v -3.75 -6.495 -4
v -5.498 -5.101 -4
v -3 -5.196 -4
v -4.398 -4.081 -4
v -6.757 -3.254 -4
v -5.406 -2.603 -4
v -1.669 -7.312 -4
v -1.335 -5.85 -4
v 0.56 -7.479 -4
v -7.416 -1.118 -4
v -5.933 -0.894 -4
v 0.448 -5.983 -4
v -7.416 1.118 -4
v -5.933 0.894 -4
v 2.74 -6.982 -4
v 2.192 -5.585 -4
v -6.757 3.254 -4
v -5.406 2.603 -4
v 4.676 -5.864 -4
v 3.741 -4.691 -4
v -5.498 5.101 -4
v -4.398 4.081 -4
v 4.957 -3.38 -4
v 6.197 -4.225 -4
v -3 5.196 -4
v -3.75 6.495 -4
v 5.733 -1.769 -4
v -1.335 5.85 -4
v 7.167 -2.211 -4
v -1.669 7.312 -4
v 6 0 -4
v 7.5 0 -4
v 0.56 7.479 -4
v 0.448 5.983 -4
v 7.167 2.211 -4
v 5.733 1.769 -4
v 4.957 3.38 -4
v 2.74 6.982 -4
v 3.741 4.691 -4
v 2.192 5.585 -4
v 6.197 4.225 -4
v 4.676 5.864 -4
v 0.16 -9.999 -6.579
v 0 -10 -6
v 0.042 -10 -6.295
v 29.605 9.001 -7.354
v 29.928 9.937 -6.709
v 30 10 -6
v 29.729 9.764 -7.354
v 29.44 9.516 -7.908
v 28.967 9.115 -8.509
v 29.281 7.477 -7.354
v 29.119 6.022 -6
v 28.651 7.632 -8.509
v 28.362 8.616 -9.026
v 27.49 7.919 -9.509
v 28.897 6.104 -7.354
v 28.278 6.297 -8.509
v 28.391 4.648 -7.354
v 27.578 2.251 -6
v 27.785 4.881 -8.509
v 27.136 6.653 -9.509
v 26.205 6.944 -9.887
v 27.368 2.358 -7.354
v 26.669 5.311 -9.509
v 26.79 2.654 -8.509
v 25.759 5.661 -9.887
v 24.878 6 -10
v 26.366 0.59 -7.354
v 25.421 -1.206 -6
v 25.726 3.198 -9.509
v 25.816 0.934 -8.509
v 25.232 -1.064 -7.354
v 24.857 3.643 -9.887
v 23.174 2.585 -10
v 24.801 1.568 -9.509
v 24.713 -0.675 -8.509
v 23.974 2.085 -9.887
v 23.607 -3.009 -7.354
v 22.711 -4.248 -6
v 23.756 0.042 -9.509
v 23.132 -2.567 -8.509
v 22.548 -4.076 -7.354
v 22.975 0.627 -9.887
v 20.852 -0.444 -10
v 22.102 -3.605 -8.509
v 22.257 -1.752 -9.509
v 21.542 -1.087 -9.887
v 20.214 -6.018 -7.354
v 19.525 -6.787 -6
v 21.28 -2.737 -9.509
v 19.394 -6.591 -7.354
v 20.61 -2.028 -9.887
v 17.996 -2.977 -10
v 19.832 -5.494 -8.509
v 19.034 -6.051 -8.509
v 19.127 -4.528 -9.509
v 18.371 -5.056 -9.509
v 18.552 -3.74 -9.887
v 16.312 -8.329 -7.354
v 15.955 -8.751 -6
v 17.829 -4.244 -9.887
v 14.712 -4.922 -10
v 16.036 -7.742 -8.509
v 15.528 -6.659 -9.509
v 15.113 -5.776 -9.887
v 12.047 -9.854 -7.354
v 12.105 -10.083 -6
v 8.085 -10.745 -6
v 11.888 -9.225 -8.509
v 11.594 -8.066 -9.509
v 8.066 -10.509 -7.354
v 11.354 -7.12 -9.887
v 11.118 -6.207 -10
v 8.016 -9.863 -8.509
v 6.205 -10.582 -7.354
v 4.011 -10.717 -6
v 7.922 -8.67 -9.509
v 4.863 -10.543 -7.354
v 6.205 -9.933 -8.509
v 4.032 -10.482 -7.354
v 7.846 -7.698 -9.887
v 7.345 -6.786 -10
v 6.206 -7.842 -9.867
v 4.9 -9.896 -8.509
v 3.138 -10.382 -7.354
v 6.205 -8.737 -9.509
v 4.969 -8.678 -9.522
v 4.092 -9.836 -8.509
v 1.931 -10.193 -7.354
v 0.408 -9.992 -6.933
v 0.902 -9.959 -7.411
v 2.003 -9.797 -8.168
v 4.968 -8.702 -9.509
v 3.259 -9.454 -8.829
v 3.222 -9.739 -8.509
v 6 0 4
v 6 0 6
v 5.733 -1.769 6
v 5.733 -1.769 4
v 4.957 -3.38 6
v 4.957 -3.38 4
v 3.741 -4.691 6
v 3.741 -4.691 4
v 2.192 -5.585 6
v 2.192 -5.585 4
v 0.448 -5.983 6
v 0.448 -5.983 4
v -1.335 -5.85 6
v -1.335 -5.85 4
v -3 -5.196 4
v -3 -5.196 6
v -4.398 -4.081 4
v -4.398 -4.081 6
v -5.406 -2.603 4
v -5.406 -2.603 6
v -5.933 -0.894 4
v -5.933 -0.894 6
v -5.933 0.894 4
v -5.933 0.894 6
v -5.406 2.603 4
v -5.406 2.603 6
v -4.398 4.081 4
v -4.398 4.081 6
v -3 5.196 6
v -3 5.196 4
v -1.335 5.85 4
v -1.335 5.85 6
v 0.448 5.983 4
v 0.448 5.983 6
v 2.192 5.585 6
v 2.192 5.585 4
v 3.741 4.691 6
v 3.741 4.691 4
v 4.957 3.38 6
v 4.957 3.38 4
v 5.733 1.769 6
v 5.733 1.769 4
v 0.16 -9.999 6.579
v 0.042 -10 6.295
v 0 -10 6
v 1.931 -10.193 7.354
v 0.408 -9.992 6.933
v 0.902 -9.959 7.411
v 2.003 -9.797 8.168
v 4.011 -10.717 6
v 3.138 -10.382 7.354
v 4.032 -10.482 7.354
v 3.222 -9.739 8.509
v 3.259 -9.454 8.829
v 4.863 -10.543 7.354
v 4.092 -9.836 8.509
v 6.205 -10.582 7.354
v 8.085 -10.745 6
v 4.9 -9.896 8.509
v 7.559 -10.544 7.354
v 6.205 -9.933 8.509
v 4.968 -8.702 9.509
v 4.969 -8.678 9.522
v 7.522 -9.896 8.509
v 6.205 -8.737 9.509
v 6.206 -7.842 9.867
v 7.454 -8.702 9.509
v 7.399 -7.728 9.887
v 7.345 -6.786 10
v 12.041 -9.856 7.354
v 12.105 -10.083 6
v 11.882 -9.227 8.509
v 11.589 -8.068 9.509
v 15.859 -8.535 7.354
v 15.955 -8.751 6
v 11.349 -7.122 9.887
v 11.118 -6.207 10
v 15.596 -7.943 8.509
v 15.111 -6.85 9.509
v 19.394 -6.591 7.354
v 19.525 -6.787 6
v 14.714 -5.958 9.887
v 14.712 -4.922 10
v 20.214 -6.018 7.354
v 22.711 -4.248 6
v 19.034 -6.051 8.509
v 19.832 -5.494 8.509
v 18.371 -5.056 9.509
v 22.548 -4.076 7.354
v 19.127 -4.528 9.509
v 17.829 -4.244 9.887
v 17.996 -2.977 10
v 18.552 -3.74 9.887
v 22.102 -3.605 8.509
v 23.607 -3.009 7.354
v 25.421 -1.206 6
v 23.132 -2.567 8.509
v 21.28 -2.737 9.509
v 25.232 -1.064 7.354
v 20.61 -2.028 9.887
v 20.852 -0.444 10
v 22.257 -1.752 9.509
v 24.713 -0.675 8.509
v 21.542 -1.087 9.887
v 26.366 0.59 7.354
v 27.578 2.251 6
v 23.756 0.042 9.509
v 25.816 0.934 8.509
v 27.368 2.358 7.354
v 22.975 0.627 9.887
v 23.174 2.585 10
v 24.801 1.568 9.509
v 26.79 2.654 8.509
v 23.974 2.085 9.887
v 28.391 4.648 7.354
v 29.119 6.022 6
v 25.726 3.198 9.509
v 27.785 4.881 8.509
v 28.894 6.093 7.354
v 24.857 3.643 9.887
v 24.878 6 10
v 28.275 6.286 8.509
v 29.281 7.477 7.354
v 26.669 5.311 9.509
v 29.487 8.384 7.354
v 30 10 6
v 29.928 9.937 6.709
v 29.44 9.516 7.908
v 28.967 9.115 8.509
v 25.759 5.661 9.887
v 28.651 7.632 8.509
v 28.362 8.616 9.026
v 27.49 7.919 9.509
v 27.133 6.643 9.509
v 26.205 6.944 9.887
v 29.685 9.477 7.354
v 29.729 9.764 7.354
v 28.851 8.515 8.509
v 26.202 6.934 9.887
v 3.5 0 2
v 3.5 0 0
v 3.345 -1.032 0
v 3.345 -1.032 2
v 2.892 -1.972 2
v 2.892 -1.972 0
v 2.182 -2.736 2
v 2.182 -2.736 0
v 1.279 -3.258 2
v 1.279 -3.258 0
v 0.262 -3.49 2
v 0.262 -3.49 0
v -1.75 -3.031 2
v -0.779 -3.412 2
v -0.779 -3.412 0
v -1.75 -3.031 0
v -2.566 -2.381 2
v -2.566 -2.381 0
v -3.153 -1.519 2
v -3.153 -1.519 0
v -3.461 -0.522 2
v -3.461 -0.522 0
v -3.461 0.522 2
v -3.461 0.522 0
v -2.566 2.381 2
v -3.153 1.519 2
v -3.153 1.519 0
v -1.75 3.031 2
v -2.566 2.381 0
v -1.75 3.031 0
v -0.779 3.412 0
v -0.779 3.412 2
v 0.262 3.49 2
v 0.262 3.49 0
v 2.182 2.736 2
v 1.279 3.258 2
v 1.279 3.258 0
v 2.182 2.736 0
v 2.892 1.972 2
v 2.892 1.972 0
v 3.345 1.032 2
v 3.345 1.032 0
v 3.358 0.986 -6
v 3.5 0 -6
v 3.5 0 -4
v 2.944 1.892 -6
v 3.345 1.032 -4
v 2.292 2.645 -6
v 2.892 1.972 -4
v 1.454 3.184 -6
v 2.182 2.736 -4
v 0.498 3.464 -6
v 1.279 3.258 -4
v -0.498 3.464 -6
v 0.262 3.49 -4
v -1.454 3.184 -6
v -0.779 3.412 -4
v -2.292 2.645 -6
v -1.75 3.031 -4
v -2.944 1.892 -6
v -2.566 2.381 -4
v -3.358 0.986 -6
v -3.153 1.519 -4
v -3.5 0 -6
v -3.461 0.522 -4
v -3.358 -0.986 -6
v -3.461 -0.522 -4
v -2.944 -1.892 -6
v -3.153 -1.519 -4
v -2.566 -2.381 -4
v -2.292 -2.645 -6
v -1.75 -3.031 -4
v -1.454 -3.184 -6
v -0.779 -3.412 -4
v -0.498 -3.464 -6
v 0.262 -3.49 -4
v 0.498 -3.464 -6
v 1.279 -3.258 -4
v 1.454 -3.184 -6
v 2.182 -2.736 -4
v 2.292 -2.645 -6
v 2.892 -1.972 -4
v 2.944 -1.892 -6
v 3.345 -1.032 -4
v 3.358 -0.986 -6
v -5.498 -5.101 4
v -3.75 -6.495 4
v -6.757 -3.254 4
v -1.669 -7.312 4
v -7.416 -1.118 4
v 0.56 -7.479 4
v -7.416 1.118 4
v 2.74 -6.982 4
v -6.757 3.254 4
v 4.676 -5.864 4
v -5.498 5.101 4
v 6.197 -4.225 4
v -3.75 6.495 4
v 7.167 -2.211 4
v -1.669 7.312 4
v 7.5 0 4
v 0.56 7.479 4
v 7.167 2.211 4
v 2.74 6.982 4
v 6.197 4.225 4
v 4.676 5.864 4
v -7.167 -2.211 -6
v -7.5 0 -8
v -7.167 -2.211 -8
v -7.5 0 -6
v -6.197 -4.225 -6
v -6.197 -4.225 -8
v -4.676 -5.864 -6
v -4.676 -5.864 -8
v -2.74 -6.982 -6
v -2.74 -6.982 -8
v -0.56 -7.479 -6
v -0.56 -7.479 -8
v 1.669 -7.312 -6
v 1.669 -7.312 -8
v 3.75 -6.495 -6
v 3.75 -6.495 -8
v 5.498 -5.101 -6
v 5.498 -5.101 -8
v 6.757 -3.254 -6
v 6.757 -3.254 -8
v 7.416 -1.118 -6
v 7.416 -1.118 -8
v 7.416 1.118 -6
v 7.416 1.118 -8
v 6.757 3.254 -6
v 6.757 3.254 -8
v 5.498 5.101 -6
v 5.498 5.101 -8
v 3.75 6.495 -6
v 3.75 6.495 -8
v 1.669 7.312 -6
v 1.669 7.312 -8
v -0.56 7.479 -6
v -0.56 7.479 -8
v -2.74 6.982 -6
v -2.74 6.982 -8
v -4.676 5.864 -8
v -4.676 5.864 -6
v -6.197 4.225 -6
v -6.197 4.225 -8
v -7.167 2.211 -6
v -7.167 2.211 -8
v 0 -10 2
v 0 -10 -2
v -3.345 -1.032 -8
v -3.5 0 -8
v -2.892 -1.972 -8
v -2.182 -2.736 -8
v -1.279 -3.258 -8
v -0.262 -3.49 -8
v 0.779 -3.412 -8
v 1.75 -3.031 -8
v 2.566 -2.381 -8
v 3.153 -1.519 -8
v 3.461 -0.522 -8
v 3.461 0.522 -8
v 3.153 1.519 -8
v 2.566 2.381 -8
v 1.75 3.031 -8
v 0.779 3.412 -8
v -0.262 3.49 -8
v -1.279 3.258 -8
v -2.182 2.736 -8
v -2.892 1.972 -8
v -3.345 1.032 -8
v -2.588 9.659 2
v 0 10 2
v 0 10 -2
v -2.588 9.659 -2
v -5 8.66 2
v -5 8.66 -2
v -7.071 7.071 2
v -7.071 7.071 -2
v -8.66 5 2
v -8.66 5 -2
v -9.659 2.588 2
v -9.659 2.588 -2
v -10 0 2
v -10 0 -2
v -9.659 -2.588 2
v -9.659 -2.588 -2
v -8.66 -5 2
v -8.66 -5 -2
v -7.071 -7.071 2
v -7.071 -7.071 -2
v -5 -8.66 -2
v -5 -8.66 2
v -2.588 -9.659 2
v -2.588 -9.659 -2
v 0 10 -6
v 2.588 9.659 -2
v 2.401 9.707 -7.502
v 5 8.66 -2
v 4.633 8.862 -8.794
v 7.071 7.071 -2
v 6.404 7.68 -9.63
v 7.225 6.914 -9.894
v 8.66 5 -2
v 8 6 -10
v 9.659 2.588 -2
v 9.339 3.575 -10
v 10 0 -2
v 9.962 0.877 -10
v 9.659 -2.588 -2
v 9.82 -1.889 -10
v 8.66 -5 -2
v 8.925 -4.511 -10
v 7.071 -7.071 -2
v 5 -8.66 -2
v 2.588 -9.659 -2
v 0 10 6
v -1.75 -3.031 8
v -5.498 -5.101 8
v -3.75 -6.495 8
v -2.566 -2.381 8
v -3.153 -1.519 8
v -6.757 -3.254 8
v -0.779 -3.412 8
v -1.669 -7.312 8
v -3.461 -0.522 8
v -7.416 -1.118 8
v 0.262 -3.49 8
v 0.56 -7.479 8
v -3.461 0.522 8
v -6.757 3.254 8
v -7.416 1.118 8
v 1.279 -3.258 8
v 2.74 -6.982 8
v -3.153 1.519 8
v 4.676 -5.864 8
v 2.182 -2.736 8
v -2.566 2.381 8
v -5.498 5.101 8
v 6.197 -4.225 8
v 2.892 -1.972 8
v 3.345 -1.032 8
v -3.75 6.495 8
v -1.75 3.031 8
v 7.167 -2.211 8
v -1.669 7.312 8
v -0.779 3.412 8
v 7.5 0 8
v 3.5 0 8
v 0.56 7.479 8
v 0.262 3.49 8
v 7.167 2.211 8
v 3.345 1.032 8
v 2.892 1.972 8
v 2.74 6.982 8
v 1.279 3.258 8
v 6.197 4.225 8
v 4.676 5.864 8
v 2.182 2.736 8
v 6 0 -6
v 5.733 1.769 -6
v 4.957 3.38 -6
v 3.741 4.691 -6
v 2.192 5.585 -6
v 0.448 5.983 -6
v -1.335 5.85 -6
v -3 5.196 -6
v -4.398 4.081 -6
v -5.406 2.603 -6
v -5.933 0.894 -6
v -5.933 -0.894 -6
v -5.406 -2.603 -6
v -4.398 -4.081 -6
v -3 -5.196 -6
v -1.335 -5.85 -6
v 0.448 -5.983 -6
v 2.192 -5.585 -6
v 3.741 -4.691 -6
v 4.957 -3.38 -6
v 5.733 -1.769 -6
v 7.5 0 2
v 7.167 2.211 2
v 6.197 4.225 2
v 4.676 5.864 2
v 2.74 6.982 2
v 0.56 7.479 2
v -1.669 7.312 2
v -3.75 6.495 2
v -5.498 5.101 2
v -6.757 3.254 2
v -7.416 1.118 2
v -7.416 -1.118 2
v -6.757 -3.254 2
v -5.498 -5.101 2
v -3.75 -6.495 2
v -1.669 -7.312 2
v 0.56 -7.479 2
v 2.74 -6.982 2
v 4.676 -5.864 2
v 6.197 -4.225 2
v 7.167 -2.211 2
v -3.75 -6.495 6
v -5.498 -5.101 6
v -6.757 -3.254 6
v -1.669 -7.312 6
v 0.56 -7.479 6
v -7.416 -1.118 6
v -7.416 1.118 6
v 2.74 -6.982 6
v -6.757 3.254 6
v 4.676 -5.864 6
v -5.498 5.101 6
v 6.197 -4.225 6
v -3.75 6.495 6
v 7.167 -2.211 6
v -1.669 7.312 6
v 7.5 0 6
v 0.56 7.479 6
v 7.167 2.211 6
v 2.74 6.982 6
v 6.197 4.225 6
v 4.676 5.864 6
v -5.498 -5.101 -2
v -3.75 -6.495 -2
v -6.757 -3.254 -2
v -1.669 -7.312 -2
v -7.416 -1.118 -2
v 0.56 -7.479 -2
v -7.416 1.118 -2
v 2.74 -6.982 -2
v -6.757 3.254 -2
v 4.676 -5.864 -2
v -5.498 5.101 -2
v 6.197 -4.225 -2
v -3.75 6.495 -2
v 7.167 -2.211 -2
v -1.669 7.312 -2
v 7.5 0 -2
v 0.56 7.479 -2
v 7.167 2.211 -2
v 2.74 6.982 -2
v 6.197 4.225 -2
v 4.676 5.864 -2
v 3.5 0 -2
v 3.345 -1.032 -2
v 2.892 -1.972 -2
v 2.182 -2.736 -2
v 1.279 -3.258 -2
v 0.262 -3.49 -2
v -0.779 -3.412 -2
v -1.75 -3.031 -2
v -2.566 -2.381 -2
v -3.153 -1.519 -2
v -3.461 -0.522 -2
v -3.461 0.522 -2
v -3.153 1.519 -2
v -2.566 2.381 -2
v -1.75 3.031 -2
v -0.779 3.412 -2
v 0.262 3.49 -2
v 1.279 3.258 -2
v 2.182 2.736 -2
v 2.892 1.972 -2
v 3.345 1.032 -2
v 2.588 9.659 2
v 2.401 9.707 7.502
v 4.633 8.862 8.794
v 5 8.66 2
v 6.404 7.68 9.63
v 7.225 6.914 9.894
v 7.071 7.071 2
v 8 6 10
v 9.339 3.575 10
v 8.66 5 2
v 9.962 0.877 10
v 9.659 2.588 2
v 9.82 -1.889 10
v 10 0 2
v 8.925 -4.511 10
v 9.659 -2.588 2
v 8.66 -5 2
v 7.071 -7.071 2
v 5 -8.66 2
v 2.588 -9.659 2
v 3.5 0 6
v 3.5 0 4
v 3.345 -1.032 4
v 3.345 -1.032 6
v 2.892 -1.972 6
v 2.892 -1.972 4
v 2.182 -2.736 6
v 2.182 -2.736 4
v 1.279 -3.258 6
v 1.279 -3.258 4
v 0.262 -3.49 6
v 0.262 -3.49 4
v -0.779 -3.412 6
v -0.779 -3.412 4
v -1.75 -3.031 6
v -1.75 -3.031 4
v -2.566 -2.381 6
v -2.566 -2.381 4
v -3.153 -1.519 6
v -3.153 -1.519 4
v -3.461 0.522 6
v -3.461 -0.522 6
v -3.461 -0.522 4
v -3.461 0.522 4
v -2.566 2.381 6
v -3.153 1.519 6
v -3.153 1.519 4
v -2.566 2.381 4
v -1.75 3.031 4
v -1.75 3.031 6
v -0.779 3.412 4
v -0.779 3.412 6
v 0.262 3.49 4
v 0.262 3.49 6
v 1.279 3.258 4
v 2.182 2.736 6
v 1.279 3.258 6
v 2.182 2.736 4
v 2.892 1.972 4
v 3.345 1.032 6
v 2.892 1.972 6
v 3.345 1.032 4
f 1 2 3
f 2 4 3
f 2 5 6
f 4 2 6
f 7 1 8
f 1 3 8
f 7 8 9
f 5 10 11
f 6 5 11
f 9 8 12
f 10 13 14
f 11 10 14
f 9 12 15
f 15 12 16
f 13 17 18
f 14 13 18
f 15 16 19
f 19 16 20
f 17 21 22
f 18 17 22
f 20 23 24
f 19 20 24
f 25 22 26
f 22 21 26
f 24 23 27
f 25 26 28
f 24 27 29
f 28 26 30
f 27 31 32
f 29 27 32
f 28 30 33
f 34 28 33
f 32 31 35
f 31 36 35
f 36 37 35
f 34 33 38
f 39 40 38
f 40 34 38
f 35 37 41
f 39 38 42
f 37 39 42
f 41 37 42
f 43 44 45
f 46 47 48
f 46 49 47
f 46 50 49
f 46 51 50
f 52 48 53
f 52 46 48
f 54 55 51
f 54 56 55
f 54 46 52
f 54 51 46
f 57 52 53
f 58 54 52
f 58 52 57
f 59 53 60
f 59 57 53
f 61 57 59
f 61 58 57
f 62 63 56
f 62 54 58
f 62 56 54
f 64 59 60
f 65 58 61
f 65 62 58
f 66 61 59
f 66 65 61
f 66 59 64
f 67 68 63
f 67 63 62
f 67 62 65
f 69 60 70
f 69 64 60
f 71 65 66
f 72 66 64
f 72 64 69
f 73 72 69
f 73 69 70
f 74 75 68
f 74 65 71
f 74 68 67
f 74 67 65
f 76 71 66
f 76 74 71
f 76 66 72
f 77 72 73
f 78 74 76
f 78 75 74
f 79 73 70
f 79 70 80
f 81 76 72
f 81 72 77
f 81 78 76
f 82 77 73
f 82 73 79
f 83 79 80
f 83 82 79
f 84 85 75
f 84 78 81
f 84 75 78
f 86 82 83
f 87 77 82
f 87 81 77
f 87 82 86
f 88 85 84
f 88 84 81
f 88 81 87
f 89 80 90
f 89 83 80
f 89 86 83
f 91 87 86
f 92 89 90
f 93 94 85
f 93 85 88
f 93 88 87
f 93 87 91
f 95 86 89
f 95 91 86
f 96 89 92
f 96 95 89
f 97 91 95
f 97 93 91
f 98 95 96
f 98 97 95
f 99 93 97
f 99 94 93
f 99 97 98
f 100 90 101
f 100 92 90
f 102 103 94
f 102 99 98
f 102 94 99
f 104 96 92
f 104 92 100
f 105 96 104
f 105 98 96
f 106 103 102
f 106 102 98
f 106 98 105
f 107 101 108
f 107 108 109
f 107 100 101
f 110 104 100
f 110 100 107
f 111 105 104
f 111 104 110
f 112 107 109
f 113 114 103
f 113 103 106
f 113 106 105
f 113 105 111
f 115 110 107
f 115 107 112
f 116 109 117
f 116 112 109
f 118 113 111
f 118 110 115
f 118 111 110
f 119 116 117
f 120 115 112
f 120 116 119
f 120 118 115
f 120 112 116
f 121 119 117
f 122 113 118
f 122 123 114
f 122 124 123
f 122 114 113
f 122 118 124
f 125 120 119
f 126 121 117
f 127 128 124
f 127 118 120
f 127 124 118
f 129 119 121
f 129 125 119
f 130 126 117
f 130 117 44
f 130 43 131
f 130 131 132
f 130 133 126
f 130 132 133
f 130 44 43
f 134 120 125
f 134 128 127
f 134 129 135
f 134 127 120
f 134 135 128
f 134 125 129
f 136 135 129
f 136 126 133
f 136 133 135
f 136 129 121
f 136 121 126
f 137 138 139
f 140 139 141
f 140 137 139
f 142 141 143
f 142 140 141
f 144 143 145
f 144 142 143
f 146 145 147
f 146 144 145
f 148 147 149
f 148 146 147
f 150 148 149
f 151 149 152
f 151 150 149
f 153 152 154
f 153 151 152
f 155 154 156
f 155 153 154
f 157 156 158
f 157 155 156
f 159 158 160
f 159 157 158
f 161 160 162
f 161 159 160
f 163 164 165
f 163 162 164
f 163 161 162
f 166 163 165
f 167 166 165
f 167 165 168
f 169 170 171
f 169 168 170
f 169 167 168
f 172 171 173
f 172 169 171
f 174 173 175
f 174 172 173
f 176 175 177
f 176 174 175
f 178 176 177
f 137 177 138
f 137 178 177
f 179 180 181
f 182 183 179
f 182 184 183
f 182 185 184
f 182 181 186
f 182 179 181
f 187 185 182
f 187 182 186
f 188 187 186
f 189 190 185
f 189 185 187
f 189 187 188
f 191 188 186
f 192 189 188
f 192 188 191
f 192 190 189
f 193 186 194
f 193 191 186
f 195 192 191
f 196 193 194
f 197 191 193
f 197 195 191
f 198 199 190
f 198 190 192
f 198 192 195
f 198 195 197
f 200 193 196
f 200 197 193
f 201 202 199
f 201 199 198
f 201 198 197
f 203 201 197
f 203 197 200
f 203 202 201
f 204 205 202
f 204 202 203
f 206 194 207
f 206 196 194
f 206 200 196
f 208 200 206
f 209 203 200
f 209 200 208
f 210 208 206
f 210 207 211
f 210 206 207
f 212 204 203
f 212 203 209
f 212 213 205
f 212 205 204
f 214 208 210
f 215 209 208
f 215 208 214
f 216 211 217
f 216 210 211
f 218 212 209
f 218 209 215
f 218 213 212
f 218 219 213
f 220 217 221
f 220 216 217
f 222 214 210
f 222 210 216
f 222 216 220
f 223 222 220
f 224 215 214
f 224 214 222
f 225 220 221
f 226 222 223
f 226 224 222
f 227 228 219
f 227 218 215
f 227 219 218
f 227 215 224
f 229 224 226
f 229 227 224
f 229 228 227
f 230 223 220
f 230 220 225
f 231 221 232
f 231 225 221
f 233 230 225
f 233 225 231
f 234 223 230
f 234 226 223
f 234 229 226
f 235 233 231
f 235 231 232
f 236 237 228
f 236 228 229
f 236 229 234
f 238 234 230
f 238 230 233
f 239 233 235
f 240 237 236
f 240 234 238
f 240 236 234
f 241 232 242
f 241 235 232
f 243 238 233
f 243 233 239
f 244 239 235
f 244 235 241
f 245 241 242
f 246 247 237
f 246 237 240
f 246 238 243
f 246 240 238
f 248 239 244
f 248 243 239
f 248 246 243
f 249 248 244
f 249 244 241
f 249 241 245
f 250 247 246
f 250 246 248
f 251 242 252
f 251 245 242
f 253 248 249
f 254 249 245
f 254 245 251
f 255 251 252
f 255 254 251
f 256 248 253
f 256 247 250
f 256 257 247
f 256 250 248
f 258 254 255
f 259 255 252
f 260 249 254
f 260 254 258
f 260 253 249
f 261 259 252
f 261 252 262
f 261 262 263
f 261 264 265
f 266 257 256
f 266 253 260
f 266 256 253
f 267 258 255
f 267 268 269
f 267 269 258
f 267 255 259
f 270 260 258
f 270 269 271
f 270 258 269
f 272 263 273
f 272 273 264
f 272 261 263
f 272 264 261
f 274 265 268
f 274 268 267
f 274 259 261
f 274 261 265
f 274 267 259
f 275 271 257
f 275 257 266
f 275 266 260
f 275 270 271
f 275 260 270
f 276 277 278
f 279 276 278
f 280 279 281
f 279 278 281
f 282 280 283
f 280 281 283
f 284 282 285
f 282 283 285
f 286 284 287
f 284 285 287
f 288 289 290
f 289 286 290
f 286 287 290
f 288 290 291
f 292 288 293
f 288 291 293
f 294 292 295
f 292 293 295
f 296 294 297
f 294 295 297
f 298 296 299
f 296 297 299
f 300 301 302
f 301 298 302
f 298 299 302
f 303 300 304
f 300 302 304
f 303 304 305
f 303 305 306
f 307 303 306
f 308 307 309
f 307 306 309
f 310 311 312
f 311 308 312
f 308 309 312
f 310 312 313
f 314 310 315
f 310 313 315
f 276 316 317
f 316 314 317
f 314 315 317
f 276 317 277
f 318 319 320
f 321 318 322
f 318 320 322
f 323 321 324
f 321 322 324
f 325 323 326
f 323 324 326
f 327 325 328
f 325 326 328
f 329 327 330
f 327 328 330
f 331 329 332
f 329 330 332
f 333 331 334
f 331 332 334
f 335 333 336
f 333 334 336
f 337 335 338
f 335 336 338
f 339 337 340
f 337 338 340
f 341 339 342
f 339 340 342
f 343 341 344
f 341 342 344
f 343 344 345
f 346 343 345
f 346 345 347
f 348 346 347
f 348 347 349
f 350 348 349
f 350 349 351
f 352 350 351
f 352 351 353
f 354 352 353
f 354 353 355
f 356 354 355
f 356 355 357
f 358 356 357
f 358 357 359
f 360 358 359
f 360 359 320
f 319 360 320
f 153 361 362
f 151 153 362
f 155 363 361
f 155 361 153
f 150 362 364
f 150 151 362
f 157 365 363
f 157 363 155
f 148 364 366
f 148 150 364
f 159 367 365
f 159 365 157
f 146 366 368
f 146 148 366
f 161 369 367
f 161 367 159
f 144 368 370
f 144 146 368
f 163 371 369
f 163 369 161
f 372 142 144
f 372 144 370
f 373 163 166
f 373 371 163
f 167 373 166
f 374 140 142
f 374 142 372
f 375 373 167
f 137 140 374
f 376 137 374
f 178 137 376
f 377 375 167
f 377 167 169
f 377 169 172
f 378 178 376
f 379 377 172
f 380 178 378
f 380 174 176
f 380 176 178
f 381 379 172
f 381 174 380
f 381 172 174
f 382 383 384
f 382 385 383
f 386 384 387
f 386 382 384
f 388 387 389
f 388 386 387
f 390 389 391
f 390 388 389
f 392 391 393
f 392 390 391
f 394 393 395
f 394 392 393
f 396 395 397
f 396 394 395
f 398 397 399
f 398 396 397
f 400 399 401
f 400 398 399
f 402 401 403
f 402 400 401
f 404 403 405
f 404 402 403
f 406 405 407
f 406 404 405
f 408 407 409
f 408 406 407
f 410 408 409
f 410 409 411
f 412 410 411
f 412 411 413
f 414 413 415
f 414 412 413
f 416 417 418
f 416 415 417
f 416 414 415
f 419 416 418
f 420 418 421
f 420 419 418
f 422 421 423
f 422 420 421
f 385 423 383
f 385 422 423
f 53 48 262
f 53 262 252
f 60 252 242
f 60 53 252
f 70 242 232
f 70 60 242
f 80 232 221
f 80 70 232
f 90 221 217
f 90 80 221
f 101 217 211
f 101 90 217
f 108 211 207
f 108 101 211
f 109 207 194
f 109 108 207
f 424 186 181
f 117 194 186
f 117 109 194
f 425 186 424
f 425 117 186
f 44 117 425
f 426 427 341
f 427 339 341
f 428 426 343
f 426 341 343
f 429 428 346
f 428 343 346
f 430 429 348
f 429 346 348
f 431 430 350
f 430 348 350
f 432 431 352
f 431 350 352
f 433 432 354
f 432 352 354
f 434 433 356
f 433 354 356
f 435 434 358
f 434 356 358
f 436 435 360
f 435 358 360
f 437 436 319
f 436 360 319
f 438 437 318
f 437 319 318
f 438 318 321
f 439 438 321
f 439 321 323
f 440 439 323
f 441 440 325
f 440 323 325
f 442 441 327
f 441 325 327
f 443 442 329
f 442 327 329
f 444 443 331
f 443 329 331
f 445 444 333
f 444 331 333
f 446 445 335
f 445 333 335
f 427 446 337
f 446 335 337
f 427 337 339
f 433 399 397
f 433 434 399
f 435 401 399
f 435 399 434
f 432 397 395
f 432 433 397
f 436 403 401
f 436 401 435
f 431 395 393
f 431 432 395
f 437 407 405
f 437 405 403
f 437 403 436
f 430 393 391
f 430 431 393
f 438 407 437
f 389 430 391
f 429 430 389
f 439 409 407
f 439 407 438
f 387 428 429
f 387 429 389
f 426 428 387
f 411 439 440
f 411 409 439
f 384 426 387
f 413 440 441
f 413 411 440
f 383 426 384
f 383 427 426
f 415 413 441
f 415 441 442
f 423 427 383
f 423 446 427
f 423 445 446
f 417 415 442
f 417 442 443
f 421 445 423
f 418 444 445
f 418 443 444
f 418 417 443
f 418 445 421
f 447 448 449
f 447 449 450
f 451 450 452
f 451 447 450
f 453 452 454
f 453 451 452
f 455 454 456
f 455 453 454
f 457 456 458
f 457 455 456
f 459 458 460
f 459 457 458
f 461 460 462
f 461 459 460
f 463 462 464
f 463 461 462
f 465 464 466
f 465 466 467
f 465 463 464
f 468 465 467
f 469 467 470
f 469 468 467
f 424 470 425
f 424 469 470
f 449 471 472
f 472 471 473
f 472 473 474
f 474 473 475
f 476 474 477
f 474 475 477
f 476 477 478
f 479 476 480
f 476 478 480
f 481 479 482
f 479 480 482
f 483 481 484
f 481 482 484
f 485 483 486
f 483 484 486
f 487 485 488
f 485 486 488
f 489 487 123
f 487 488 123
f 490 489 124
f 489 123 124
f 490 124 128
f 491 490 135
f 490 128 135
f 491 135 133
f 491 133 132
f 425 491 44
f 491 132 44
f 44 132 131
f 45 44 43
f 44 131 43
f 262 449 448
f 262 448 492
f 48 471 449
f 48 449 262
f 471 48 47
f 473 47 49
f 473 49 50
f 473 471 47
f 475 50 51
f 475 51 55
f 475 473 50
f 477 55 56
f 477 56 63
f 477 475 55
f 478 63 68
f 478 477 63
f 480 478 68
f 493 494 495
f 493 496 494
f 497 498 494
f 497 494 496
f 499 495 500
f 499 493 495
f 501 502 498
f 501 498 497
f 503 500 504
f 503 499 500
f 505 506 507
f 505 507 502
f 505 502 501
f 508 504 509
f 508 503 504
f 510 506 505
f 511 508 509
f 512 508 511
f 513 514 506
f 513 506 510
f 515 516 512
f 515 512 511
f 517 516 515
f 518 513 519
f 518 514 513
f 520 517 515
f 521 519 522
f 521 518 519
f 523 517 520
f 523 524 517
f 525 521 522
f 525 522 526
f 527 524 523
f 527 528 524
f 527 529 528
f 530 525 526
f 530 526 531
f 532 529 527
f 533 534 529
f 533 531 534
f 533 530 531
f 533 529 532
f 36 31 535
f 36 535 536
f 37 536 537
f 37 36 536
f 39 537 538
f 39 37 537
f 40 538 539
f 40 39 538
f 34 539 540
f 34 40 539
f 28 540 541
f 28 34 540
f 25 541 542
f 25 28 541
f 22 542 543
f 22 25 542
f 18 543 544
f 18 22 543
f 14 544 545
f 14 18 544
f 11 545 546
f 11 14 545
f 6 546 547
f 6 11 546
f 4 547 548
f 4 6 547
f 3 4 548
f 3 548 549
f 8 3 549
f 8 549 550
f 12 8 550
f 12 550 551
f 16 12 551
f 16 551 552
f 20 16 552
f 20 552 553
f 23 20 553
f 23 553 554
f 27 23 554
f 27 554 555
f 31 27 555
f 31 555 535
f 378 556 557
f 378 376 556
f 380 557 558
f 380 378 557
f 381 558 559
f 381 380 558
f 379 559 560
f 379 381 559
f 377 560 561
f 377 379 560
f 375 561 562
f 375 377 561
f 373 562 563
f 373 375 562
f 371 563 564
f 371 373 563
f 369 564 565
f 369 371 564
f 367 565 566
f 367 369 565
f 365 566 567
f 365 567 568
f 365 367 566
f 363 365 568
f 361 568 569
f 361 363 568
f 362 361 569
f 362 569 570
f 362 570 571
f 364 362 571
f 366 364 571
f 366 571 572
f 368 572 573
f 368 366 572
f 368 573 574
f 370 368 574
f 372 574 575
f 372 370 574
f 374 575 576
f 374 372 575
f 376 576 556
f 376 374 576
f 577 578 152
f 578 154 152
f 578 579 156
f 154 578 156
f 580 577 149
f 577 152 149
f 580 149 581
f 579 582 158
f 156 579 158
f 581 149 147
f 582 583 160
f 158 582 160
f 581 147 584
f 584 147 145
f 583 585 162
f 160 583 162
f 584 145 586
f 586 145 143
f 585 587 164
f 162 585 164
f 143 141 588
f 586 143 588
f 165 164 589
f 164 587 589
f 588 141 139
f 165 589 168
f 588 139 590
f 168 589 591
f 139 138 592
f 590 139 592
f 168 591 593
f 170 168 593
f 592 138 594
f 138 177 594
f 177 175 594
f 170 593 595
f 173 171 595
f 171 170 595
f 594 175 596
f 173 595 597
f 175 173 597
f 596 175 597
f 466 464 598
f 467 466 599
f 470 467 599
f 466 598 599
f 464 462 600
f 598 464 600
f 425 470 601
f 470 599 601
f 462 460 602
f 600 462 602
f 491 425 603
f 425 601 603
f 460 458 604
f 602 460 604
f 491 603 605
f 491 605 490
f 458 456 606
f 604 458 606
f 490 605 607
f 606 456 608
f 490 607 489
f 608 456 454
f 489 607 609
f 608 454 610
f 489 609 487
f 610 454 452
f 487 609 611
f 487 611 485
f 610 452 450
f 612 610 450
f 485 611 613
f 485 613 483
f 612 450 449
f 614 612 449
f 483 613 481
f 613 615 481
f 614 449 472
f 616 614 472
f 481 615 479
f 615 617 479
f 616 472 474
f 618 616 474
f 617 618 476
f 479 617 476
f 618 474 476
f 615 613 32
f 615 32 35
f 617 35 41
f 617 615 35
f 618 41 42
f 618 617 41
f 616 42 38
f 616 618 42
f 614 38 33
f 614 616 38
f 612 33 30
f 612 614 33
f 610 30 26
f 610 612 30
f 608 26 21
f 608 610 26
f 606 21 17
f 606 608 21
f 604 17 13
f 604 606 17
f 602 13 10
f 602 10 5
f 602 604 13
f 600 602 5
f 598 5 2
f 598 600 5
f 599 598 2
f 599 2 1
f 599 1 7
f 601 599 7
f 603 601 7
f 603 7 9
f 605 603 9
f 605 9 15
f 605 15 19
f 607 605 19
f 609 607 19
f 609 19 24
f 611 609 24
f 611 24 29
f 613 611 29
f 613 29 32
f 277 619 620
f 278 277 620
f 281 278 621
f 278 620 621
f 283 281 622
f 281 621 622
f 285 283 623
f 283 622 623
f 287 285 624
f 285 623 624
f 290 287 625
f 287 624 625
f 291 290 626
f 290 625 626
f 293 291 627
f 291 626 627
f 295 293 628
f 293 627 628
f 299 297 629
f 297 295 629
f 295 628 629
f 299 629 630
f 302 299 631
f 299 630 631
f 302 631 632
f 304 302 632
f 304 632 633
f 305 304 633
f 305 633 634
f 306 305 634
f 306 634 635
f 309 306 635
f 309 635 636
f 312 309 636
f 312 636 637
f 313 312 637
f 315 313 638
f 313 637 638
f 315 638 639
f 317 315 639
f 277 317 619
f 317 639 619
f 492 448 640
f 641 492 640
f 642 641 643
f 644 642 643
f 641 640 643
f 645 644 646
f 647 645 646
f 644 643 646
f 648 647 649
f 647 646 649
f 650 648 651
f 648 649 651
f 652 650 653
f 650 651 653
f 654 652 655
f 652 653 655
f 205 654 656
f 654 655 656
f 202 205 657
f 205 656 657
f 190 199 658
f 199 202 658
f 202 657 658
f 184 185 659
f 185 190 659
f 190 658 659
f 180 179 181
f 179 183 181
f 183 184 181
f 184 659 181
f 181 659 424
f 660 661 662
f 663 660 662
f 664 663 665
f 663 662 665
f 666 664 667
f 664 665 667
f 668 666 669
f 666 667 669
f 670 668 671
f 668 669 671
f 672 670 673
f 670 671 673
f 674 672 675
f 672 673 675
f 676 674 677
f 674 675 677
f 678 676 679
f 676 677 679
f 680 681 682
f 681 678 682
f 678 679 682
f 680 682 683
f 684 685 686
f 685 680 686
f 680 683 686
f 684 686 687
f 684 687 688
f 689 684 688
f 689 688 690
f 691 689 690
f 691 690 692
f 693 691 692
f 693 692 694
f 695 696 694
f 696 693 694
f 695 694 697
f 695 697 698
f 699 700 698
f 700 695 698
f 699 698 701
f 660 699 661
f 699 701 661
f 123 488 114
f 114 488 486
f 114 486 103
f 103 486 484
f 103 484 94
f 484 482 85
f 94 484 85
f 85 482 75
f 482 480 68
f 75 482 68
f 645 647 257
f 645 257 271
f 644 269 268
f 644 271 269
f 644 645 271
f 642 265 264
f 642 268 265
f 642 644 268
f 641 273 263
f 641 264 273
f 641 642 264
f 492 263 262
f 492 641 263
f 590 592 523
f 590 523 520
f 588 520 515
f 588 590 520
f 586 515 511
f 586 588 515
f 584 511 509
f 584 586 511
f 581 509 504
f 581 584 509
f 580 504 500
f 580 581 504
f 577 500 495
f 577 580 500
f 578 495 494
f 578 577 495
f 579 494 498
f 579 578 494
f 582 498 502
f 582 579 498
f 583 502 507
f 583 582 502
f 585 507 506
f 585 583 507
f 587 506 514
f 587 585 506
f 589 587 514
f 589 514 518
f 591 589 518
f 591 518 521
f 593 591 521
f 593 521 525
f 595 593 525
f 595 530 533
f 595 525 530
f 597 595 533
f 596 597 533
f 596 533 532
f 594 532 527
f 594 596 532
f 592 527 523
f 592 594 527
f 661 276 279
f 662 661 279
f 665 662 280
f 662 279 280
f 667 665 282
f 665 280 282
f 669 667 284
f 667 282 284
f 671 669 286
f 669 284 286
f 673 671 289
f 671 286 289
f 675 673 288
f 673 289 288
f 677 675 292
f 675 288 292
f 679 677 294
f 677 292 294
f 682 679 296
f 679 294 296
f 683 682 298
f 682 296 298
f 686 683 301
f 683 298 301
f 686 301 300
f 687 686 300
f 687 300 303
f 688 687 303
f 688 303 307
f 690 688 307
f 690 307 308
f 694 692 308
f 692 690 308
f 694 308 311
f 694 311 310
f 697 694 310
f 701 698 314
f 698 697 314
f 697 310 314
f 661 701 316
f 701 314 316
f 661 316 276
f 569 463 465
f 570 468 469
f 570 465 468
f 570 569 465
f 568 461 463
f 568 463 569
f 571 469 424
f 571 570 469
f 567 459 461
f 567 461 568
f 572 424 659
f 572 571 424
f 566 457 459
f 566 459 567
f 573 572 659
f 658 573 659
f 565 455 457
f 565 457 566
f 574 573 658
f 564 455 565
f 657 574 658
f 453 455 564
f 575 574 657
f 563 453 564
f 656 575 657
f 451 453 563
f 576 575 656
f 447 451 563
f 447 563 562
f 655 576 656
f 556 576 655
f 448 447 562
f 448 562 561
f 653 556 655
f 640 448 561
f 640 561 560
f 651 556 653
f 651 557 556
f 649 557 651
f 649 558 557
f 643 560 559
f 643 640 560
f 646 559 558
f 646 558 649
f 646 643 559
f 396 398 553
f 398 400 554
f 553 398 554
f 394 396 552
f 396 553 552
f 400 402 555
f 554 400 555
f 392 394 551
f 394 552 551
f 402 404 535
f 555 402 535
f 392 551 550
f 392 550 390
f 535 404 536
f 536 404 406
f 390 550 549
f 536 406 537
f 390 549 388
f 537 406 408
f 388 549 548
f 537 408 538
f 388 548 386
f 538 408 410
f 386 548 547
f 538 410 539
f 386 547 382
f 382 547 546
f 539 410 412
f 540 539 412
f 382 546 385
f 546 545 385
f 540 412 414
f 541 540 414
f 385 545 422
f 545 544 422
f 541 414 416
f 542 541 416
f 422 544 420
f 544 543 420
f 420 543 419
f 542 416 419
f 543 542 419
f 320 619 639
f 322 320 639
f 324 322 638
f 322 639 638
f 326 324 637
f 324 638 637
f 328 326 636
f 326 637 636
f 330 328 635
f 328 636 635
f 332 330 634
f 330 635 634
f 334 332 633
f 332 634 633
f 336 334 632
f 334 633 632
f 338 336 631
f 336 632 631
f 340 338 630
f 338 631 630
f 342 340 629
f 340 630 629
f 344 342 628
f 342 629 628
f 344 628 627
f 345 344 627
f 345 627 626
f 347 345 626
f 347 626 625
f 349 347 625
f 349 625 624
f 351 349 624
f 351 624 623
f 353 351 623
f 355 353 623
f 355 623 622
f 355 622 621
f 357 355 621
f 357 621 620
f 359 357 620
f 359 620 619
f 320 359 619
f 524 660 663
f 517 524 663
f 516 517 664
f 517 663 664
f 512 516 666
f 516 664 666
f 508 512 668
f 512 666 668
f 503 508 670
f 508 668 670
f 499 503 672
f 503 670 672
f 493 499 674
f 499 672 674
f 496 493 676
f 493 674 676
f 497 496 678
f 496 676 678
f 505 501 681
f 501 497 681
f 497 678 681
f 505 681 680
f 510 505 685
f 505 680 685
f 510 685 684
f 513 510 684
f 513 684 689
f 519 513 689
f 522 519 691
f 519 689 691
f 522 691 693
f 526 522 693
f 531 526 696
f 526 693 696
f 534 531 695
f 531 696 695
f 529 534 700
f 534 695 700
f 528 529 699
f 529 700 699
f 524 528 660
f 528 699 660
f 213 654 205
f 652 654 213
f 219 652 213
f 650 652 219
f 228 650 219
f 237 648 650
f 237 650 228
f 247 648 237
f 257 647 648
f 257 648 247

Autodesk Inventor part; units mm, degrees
ref_plane "YZ Plane" through (0, 0, 0) normal (1, 0, 0) x (0, 1, 0)
ref_plane "XZ Plane" through (0, 0, 0) normal (0, 1, 0) x (-1, 0, 0)
ref_plane "XY Plane" through (0, 0, 0) normal (0, 0, 1) x (1, 0, 0)
sketch "Sketch1" plane through (0, 0, 0) normal (0, 0, 1) x (1, 0, 0)
  circle A0 centre (0, 0) radius 10
  line L0 (0, 10) -> (30, 10)
  arc A1 (0, -10) -> (30, 10) centre (6.2119, 13.1822) ccw
  circle A2 centre (0, 0) radius 3.5
  circle A3 centre (0, 0) radius 7.5
  circle A4 centre (0, 0) radius 6
  dimension "d0" = 20
  dimension "d1" = 30
  dimension "d2" = 24
  dimension "d3" = 10
  dimension "d4" = 13.1822
  dimension "d5" = 7
  dimension "d6" = 15
  dimension "d7" = 12
extrude "Extrusion1" add sketch "Sketch1" along normal mid plane 20 contours A0 L0 A1
extrude "Extrusion2" add sketch "Sketch1" along normal mid plane 4 contours A0 | A3 | A4
extrude "Extrusion3" add sketch "Sketch1" along normal mid plane 8 contours A3 | A4
extrude "Extrusion4" add sketch "Sketch1" along normal mid plane 12 contours A4
sketch "Sketch2" plane through (0, 0, 6) normal (0, 0, 1) x (1, 0, 0)
  circle A0 centre (0, 0) radius 7.5
  circle A1 centre (0, 0) radius 3.5
  dimension "d16" = 15
  dimension "d18" = 7
sketch "Sketch3" plane through (0, 0, -6) normal (0, 0, -1) x (-1, 0, 0)
  circle A0 centre (0, 0) radius 7.5
  circle A1 centre (0, 0) radius 3.5
  dimension "d17" = 15
  dimension "d19" = 7
extrude "Extrusion5" add sketch "Sketch3" along normal blind 2
extrude "Extrusion6" add sketch "Sketch2" along normal blind 2
fillet "Fillet1" radius 4 4 edges at (15, 10, -10) (19.5247, -6.7871, -10) (19.5247, -6.7871, 10) (15, 10, 10)
properties part number "TapPart"
